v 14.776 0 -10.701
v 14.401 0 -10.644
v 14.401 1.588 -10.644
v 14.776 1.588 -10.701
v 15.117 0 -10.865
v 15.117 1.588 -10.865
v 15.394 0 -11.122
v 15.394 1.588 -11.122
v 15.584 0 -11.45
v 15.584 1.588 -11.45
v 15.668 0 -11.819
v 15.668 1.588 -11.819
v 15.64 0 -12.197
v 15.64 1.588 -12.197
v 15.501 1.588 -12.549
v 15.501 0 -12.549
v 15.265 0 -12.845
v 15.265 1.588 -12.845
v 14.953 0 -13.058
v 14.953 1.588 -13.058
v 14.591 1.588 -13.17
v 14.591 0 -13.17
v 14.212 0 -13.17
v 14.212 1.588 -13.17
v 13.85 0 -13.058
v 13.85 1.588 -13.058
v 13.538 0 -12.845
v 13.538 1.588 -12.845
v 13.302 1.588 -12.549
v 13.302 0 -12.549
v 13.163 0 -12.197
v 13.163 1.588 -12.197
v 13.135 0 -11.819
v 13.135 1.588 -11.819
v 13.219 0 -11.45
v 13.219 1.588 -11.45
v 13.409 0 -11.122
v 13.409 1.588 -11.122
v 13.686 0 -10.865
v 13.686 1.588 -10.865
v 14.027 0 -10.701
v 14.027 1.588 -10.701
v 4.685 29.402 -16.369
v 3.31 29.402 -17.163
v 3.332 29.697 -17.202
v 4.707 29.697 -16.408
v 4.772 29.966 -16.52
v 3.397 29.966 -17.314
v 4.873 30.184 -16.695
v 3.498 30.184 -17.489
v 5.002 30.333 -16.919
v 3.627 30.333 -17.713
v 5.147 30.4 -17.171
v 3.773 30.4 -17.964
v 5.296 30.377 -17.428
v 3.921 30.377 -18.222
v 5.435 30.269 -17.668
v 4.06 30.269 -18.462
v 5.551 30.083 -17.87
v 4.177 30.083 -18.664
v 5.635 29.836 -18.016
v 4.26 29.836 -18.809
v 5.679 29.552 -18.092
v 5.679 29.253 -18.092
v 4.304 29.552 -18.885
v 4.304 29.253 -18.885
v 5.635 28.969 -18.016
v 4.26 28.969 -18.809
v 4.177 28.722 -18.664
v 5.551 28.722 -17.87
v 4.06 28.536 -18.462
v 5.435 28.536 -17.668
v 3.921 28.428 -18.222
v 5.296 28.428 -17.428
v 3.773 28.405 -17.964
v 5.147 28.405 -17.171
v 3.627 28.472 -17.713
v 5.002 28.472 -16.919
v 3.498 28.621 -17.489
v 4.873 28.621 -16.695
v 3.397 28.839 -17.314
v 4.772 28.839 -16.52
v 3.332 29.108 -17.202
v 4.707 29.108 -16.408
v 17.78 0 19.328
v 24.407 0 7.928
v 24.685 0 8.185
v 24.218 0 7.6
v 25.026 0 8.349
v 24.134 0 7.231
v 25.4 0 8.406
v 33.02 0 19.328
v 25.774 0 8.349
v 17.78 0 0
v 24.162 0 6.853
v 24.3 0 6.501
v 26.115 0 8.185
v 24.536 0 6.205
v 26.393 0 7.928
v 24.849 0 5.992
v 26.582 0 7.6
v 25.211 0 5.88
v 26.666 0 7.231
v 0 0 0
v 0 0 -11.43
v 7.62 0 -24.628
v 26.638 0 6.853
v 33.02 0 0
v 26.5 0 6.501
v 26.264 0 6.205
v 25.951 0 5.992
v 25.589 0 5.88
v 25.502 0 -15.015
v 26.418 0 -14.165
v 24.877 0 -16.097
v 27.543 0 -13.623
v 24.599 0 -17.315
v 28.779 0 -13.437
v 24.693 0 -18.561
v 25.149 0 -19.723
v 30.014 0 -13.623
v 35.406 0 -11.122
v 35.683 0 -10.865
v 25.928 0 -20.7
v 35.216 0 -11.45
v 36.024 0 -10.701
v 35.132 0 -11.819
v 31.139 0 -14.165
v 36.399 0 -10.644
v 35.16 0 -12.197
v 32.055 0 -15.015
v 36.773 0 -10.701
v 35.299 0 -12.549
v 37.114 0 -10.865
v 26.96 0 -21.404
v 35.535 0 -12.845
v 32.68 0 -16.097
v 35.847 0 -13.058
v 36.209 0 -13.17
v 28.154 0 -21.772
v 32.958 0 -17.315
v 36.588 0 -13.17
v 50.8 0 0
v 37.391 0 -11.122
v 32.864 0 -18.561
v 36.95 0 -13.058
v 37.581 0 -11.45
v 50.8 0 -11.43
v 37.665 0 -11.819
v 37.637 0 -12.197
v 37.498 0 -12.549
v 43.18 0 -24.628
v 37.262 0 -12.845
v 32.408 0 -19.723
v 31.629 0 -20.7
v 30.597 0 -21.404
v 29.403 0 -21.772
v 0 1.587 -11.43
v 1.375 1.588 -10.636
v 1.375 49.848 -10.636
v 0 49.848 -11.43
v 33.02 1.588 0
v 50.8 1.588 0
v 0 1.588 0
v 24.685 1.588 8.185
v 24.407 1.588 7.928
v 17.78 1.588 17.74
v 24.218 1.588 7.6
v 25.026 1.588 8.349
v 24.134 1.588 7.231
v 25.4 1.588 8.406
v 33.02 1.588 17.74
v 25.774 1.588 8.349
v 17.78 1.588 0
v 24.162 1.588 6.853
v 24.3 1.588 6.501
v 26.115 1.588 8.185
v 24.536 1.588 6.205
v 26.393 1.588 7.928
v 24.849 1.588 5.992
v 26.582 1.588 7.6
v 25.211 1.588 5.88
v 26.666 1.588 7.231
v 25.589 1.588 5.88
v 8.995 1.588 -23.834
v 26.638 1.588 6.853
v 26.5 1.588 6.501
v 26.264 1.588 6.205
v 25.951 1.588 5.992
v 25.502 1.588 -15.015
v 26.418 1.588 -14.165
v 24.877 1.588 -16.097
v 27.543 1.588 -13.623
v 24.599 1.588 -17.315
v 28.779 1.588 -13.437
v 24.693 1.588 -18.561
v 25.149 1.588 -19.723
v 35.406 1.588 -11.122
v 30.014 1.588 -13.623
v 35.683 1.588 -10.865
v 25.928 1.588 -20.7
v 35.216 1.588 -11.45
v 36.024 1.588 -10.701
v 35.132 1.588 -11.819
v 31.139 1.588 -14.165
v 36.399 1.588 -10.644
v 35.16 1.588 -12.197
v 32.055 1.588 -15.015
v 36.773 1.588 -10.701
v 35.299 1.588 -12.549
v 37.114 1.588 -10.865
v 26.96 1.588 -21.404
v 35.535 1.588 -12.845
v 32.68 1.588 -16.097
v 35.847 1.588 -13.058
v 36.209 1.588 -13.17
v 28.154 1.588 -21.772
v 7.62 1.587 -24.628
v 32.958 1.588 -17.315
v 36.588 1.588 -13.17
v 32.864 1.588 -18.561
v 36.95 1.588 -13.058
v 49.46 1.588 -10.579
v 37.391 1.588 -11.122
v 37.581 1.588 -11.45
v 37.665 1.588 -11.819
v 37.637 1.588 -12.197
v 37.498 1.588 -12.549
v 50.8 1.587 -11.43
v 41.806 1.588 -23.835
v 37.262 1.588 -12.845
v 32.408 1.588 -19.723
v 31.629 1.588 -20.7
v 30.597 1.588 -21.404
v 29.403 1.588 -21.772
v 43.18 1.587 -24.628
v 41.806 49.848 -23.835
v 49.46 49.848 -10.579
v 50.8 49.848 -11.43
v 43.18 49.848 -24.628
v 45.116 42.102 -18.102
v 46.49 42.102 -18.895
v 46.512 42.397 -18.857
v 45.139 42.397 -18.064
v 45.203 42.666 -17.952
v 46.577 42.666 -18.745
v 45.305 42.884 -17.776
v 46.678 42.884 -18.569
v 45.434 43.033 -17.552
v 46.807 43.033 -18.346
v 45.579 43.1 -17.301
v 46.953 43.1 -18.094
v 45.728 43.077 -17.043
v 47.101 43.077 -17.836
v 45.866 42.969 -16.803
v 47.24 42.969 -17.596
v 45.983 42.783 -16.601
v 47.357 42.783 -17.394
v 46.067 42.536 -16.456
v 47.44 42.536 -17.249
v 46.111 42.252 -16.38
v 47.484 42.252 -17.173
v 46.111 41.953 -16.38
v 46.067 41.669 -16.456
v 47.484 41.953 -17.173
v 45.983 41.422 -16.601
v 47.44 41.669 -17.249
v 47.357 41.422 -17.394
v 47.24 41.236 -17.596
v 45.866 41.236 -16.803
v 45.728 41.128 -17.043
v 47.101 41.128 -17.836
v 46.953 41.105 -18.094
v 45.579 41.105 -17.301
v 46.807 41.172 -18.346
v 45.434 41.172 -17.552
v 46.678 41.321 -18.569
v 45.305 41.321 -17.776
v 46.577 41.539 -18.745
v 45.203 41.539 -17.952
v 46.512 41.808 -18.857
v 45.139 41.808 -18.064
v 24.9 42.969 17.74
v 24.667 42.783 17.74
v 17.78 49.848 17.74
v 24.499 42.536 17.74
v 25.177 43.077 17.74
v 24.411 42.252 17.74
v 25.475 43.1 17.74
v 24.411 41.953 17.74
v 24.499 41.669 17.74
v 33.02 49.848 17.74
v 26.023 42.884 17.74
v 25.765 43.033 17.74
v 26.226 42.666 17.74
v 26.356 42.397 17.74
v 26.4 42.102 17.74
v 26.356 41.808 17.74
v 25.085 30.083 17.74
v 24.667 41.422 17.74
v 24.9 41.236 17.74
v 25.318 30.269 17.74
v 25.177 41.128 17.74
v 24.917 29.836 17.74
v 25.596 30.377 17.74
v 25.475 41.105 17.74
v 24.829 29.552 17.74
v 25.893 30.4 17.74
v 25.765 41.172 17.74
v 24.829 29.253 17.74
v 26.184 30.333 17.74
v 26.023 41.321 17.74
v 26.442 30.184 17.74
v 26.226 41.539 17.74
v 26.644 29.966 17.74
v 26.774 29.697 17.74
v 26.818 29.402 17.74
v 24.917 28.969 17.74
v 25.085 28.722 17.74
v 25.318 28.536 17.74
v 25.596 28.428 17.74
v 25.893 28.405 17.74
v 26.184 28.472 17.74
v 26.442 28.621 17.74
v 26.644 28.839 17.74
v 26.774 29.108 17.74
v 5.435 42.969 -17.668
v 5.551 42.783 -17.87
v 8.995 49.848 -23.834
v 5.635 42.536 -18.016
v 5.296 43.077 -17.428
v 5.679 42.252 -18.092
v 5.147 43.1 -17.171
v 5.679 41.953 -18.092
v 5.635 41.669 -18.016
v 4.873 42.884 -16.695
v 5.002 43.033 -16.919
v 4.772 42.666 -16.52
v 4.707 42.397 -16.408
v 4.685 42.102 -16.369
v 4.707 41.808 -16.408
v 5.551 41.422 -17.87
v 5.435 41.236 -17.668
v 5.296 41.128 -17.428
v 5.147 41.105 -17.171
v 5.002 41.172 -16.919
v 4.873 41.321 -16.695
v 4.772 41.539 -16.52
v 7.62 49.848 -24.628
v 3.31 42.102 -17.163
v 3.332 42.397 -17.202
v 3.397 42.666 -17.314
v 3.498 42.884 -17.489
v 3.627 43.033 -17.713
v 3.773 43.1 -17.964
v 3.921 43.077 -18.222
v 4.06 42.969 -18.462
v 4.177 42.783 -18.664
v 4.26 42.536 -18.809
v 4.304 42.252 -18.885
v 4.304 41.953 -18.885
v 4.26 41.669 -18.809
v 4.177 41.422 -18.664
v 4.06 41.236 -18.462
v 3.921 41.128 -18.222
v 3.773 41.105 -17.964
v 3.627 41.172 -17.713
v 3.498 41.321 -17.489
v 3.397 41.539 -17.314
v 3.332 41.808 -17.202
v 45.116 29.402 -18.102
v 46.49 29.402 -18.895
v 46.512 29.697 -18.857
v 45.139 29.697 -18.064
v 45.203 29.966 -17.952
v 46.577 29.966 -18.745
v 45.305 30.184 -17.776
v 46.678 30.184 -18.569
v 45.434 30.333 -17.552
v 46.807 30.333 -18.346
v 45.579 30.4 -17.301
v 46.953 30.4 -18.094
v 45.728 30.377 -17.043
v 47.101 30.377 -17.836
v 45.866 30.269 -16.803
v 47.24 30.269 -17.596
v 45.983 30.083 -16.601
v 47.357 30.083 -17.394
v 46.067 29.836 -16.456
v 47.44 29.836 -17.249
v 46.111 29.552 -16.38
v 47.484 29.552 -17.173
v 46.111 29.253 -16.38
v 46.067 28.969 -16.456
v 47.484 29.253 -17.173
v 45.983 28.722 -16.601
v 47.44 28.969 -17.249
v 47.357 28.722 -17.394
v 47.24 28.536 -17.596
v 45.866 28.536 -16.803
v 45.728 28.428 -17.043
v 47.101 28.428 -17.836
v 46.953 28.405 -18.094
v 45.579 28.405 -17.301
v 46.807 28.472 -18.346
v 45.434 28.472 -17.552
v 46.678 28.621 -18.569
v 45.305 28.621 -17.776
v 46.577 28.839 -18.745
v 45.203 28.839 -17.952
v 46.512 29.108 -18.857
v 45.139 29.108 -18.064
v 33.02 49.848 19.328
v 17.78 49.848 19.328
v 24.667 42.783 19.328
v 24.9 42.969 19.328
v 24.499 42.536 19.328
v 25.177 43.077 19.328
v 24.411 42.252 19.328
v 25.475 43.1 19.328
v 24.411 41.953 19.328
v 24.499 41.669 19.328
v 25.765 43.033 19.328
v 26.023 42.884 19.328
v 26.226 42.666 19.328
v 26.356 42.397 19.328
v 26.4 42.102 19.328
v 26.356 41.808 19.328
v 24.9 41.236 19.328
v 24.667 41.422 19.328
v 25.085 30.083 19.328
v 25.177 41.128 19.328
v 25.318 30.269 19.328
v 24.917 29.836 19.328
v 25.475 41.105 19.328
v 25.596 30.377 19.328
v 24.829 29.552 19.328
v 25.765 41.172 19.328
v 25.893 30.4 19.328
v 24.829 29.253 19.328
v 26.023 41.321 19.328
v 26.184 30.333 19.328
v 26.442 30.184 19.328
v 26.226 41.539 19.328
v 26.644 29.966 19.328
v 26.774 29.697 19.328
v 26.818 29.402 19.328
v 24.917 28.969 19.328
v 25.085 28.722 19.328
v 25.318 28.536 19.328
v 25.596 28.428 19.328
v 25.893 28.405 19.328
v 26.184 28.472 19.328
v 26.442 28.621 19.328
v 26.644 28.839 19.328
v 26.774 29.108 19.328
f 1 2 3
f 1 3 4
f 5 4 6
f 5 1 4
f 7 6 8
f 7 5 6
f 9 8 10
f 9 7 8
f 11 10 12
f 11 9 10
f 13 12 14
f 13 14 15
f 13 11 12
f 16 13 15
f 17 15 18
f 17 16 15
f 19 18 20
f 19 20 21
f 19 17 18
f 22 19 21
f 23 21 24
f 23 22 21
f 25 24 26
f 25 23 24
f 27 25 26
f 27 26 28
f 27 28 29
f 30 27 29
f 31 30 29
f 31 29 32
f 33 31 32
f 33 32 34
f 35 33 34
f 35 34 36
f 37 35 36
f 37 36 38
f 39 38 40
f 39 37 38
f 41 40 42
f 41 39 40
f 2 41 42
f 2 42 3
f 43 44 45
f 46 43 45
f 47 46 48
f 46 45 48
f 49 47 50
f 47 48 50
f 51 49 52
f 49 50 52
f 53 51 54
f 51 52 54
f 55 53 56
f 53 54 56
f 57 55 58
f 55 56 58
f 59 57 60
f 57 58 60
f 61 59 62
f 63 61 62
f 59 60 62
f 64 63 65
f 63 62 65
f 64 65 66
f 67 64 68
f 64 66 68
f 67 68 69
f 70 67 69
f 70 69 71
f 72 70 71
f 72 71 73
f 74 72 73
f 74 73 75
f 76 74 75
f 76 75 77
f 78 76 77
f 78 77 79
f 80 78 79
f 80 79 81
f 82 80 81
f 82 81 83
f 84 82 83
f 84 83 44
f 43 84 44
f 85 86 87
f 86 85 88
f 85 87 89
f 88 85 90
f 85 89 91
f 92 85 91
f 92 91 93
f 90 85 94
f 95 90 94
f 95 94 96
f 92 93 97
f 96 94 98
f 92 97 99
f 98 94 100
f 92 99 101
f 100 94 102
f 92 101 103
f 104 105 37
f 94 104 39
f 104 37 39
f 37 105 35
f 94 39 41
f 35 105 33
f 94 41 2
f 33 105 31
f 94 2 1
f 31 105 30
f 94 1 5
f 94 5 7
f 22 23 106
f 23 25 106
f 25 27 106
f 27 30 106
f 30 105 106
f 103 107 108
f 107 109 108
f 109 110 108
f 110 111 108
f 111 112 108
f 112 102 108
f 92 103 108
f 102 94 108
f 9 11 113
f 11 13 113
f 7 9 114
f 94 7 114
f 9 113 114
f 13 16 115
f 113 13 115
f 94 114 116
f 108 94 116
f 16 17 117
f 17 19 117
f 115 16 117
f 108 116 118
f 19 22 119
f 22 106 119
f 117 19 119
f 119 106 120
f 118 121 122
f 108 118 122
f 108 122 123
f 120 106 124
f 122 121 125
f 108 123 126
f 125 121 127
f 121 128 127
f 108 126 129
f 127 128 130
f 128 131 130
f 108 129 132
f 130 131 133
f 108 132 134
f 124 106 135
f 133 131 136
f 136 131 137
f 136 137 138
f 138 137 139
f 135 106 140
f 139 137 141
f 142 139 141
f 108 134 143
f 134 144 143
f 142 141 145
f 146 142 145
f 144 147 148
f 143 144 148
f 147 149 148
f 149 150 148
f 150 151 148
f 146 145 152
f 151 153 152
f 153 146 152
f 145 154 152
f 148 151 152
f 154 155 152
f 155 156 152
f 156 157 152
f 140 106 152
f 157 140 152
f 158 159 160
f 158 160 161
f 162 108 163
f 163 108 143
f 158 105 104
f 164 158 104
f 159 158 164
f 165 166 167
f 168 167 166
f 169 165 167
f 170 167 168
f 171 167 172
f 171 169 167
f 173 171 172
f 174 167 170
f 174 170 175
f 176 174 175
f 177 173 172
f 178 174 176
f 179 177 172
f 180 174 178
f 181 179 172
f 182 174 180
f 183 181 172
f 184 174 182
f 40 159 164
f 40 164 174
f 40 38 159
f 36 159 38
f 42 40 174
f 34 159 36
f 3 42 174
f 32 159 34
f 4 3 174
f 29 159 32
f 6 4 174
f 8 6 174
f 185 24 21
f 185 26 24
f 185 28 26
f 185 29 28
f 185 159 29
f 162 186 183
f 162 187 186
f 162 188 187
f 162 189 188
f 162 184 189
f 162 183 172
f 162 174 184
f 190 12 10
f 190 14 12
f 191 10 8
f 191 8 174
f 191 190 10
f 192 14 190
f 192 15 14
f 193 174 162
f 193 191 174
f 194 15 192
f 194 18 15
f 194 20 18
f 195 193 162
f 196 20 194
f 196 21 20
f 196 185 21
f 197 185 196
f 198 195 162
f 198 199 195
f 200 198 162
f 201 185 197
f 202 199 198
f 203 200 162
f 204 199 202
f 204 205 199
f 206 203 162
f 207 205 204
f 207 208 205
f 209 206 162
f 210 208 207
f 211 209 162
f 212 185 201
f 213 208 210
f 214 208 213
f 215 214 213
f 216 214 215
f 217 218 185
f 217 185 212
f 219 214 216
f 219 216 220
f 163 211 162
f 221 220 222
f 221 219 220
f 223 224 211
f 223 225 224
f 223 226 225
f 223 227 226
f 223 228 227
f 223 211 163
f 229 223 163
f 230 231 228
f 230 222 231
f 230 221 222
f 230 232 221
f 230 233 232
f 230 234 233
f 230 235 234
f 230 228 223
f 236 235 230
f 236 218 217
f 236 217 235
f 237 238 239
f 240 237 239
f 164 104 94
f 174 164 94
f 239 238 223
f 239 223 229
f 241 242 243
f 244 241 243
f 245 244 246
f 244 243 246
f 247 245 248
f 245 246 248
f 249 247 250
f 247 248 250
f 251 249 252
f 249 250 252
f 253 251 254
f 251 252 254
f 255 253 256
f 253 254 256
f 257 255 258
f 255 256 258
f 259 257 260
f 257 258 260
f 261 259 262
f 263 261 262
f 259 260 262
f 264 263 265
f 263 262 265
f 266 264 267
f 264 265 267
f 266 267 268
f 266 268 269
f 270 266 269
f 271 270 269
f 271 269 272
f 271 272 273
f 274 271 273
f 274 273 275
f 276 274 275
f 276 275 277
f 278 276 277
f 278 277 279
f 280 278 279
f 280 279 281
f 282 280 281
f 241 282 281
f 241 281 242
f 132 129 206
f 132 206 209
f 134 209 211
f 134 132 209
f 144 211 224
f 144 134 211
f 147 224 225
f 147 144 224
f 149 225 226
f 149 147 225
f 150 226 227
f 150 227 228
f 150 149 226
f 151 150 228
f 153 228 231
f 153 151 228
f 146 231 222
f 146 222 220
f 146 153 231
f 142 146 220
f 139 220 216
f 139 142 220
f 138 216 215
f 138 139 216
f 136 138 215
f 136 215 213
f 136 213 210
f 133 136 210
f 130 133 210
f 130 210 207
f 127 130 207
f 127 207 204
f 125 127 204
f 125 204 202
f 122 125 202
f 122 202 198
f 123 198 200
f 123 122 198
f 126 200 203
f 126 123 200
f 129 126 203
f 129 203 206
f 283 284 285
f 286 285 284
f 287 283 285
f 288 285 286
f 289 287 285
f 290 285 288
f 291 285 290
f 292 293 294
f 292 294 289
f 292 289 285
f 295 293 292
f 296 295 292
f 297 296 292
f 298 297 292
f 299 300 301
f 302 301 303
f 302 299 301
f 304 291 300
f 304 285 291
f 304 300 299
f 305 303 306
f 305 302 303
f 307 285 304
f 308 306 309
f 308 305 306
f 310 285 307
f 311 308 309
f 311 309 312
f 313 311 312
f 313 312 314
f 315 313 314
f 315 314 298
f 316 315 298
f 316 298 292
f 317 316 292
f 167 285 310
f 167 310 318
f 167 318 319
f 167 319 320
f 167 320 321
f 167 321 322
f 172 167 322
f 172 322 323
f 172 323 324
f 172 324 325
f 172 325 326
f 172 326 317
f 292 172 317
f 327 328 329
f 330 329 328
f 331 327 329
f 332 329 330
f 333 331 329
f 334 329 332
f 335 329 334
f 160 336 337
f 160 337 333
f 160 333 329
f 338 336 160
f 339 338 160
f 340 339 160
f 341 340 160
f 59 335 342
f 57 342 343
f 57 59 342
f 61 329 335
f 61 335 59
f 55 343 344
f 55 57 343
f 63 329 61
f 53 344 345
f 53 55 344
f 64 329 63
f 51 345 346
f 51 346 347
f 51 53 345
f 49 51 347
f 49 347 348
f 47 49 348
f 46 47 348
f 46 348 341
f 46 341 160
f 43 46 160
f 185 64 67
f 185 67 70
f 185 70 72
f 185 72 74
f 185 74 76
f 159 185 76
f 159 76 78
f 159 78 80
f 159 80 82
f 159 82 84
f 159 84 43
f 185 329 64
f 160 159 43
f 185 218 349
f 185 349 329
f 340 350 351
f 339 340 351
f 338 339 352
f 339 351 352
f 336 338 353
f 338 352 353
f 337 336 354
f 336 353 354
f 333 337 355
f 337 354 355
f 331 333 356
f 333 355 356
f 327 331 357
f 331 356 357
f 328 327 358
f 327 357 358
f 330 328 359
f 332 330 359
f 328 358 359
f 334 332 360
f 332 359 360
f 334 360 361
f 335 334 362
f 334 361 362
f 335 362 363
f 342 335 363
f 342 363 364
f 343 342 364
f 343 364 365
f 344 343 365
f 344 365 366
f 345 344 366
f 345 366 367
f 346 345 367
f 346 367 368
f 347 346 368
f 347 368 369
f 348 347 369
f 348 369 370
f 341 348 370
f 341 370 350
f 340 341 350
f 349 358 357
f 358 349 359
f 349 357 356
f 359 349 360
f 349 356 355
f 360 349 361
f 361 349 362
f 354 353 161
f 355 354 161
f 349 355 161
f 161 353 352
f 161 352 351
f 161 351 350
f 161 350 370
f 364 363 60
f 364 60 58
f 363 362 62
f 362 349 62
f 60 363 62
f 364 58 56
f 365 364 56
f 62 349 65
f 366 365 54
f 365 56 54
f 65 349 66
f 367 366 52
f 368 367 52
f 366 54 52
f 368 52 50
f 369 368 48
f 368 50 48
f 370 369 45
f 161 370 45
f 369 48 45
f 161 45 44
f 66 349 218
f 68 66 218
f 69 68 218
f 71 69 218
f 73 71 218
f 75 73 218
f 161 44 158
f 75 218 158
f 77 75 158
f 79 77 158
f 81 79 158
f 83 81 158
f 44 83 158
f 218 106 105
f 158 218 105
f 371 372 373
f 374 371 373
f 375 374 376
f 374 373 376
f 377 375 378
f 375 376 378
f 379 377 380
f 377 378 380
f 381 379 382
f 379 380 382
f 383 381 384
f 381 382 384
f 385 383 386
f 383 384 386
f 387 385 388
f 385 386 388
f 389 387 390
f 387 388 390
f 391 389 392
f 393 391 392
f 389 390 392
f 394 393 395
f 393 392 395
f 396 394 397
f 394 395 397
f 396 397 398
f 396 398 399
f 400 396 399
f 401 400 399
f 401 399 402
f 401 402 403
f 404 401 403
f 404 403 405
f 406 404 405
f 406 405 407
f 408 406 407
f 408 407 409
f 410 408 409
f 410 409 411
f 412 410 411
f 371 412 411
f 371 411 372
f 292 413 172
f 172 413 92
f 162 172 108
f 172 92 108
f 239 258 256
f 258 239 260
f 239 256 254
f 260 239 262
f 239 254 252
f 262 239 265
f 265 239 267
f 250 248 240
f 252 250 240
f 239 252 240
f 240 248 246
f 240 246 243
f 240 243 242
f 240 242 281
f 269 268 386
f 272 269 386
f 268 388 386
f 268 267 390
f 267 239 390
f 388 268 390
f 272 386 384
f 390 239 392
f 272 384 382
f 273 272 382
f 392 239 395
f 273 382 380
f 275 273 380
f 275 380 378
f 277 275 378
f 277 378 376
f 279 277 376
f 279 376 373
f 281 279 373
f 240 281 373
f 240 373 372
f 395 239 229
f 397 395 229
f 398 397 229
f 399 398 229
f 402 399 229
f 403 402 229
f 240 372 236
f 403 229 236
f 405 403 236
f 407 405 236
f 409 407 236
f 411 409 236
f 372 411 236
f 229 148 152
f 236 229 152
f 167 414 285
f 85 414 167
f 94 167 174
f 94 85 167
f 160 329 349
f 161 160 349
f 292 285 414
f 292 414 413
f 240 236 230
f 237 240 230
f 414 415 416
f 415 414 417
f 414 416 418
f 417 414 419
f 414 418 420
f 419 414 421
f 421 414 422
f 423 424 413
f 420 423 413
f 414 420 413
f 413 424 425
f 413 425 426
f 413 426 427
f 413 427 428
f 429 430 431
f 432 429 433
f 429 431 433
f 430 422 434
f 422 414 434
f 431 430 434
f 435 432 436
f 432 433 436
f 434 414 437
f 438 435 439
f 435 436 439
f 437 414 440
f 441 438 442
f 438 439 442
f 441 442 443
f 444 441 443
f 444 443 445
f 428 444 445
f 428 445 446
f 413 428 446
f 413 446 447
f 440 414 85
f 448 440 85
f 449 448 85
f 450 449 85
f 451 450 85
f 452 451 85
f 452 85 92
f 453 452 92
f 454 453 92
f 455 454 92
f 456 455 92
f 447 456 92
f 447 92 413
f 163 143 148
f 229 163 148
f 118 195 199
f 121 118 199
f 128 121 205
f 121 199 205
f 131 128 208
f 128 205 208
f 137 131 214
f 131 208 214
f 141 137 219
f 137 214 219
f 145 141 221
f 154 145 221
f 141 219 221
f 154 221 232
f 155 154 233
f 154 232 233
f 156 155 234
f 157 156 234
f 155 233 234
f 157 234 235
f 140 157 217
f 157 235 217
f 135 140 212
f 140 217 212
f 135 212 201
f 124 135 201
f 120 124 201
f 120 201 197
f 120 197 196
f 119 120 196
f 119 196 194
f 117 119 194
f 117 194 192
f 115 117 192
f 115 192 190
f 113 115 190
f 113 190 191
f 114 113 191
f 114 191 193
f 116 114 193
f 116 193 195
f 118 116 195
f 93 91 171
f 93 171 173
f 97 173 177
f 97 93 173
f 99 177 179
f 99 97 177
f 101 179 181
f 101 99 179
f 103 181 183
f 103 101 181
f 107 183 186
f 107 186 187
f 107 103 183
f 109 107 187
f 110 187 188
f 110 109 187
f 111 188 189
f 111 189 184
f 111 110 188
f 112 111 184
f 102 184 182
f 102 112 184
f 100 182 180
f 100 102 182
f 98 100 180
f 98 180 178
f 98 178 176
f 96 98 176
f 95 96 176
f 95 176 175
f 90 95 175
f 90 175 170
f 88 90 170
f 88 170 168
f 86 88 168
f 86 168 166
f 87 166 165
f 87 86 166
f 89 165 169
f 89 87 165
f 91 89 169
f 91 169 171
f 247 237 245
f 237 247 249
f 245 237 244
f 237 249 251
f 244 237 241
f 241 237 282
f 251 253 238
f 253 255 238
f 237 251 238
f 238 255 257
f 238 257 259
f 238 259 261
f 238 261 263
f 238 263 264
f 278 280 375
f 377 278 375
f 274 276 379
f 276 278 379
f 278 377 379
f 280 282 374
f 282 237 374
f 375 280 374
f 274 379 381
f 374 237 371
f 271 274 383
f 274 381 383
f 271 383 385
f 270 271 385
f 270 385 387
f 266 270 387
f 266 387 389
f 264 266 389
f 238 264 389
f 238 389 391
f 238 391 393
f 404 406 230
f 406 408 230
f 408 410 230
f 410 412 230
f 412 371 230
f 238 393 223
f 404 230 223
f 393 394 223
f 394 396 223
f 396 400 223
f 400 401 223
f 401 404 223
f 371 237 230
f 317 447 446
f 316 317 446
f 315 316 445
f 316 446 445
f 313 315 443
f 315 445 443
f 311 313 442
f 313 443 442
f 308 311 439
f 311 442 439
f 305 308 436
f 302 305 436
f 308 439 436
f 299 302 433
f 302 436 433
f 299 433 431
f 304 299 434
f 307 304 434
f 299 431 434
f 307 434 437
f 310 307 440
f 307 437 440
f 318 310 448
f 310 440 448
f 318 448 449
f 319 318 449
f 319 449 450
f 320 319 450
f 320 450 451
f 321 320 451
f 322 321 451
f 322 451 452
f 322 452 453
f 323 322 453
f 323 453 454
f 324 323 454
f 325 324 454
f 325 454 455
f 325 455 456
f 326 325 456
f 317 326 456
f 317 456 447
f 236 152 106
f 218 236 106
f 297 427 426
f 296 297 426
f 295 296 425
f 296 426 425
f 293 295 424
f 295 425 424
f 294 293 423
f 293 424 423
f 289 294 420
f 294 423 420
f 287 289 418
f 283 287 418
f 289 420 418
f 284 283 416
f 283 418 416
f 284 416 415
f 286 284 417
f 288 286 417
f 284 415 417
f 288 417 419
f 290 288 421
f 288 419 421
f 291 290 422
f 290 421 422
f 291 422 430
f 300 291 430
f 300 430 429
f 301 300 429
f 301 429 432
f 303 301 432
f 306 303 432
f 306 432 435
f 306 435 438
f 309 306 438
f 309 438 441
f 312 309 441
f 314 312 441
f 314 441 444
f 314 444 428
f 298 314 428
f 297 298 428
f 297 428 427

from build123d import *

# Parameters (mm, degrees)
SKETCH1_R           = 1.27
BOSS_EXTRUDE2_DEPTH = 1.5875
SKETCH2_W           = 15.24
SKETCH2_H           = 1.5875
BOSS_EXTRUDE3_DEPTH = 48.26
SKETCH3_R           = 4.191
CUT_EXTRUDE1_DEPTH  = 2.54
SKETCH4_R           = 1
CUT_EXTRUDE2_DEPTH  = 2.54
SKETCH5_R           = 1
CUT_EXTRUDE3_DEPTH  = 2.54
SKETCH6_R           = 1
CUT_EXTRUDE4_DEPTH  = 2.54


with BuildPart() as part:
    # Sketch1 → Boss-Extrude2 (new body)
    with BuildSketch(Plane(origin=(0, 0, 0), x_dir=(1, 0, 0), z_dir=(0, 1, 0))):
        Polygon((50.8, 0), (50.8, 11.43), (43.18, 24.628227154), (7.62, 24.628227154), (0, 11.43), (0, 0), (17.78, 0), (17.78, -19.327878735), (33.02, -19.327878735), (33.02, 0), align=None)
        with Locations(Location((14.401477372, 11.914121265, 0), (0, 0, 270))):
            Circle(SKETCH1_R, mode=Mode.SUBTRACT)
        with Locations(Location((36.398522628, 11.914121265, 0), (0, 0, 270))):
            Circle(SKETCH1_R, mode=Mode.SUBTRACT)
        with Locations(Location((25.4, -7.135878735, 0), (0, 0, 270))):
            Circle(SKETCH1_R, mode=Mode.SUBTRACT)
    extrude(amount=BOSS_EXTRUDE2_DEPTH)

    # Sketch2 → Boss-Extrude3 (add)
    with BuildSketch(Plane(origin=(0, 1.5875, 0), x_dir=(1, 0, 0), z_dir=(0, 1, 0))):
        with Locations((25.4, -18.534128735)):
            Rectangle(SKETCH2_W, SKETCH2_H)
        Polygon((0, 11.43), (7.62, 24.628227154), (8.994815329, 23.834477154), (1.374815329, 10.63625), align=None)
        Polygon((50.8, 11.43), (43.18, 24.628227154), (41.806418442, 23.835189471), (49.460038325, 10.578730971), align=None)
    extrude(amount=BOSS_EXTRUDE3_DEPTH)

    # Sketch3 → Cut-Extrude1 (cut)
    with BuildSketch(Plane(origin=(0, 1.5875, 0), x_dir=(1, 0, 0), z_dir=(0, 1, 0))):
        with Locations(Location((28.778522628, 17.627987154, 0), (0, 0, 270))):
            Circle(SKETCH3_R)
    extrude(amount=-CUT_EXTRUDE1_DEPTH, mode=Mode.SUBTRACT)

    # Sketch4 → Cut-Extrude2 (cut)
    with BuildSketch(Plane(origin=(43.049335183, 0, -24.854545256), x_dir=(-0.5000000000000016, 0, -0.8660254037844378), z_dir=(0.8660254037844378, 0, -0.5000000000000016))):
        with Locations((-7.881329635, 42.1025)):
            Circle(SKETCH4_R)
        with Locations((-7.881329635, 29.4025)):
            Circle(SKETCH4_R)
    extrude(amount=-CUT_EXTRUDE2_DEPTH, mode=Mode.SUBTRACT)

    # Sketch5 → Cut-Extrude3 (cut)
    with BuildSketch(Plane(origin=(-4.949335183, 0, -2.8575), x_dir=(-0.5000000000000012, 0, 0.866025403784438), z_dir=(-0.8660254037844379, 0, -0.5000000000000011))):
        with Locations((-17.518670365, 42.1025)):
            Circle(SKETCH5_R)
        with Locations((-17.518670365, 29.4025)):
            Circle(SKETCH5_R)
    extrude(amount=-CUT_EXTRUDE3_DEPTH, mode=Mode.SUBTRACT)

    # Sketch6 → Cut-Extrude4 (cut)
    with BuildSketch(Plane.XY.offset(19.327878735)):
        with Locations((25.4, 42.1025)):
            Circle(SKETCH6_R)
        with Locations((25.818223449, 29.4025)):
            Circle(SKETCH6_R)
    extrude(amount=-CUT_EXTRUDE4_DEPTH, mode=Mode.SUBTRACT)


solid = part.part
